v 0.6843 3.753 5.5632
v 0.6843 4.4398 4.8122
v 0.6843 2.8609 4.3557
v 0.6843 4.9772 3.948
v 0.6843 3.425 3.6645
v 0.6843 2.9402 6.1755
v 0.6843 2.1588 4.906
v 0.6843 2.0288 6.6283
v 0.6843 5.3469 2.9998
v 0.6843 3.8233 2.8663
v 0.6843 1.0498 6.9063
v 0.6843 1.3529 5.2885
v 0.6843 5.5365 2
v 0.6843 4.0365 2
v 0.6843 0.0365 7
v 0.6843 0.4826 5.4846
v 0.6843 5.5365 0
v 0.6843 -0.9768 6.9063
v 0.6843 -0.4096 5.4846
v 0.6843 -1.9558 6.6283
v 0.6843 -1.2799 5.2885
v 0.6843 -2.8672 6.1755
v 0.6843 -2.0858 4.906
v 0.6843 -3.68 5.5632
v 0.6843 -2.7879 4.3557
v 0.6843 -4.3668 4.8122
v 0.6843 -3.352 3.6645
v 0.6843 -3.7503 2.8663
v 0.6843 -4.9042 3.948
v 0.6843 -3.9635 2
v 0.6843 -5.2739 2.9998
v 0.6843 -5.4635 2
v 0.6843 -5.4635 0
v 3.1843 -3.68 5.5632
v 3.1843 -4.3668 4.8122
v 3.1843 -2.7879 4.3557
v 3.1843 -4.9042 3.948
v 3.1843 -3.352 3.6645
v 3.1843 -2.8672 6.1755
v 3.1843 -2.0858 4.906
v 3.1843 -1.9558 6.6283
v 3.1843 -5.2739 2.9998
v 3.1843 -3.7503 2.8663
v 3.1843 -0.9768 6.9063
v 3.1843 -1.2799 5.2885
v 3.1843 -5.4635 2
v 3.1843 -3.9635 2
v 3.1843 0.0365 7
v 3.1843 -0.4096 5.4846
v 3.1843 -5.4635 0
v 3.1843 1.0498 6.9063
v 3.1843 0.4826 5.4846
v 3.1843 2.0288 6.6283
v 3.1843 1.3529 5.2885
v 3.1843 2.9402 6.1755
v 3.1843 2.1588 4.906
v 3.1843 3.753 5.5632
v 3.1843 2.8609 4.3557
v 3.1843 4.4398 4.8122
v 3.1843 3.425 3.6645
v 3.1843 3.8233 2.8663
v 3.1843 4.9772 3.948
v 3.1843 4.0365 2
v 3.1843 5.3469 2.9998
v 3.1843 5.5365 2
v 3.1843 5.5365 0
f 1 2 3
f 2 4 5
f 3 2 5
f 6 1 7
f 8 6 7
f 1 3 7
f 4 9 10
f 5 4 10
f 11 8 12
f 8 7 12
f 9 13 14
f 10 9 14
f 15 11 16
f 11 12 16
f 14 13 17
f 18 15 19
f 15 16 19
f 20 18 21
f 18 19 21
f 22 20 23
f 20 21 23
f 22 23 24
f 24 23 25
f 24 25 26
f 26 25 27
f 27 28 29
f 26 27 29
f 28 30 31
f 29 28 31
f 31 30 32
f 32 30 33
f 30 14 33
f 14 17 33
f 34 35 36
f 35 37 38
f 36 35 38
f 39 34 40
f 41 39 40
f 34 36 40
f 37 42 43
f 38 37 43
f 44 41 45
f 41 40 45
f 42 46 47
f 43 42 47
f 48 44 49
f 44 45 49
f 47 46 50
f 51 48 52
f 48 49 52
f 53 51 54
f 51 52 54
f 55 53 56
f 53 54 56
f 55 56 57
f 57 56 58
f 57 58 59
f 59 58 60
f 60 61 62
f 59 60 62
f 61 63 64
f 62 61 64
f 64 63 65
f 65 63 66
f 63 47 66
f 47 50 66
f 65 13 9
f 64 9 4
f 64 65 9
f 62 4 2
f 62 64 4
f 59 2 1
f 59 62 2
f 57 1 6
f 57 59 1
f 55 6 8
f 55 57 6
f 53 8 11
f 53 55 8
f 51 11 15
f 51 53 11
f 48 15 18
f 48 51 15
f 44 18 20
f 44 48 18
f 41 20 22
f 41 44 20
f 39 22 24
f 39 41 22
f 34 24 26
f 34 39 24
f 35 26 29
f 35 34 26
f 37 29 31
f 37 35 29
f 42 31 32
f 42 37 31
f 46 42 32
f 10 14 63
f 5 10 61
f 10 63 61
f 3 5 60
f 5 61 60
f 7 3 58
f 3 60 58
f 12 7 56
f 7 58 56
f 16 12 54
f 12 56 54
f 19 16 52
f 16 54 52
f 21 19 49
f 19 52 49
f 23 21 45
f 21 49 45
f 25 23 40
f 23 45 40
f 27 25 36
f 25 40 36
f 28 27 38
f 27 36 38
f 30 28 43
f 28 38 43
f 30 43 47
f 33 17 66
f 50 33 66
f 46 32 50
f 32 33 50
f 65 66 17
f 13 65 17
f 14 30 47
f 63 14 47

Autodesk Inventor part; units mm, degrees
ref_plane "YZ Plane" through (0, 0, 0) normal (1, 0, 0) x (0, 1, 0)
ref_plane "XZ Plane" through (0, 0, 0) normal (0, 1, 0) x (-1, 0, 0)
ref_plane "XY Plane" through (0, 0, 0) normal (0, 0, 1) x (1, 0, 0)
sketch "Sketch1" plane through (0, 0, 0) normal (0, 0, 1) x (1, 0, 0)
  circle A0 centre (1.9343, 0.0365) radius 1.25 construction
  line L0 (0.6843, -5.4635) -> (3.1843, -5.4635)
  line L1 (3.1843, -5.4635) -> (3.1843, 5.5365)
  line L2 (3.1843, 5.5365) -> (0.6843, 5.5365)
  line L3 (0.6843, 5.5365) -> (0.6843, -5.4635)
  line L4 (0.6843, -5.4635) -> (3.1843, 5.5365) construction
  line L5 (3.1843, -5.4635) -> (0.6843, 5.5365) construction
  point P0 (0, 0)
  dimension "d0" = 11
  dimension "d1" = 2.5
extrude "Extrusion1" add sketch "Sketch1" along normal blind 2
sketch "Sketch2" plane through (3.1843, -5.4635, 0) normal (1, 0, 0) x (0, 0, -1)
  line L0 (-2, 0) -> (-2, 11) projected
  line L1 (-2, 0) -> (-2, 11)
  line L2 (-2, 5.5) -> (-7, 5.5)
  arc A0 (-2, 11) -> (-2, 0) centre (-1.475, 5.5) ccw
  line L3 (-2, 0) -> (-2, 1.5)
  line L4 (-2, 11) -> (-2, 9.5)
  line L5 (-7, 5.5) -> (-5.5, 5.5)
  arc A1 (-2, 9.5) -> (-2, 1.5) centre (-1.475, 5.5) ccw
  point P0 (0, 5.4635)
  dimension "d4" = 5
  dimension "d5" = 1.5
  dimension "d6" = 1.5
  dimension "d7" = 1.5
extrude "Extrusion2" add sketch "Sketch2" against normal up to surface (2.5 mm away) contours A0 L2 A1 L0 | A0 L0 A1 L2
equation "\"d6\" = d5"
equation "\"d7\" = d5"
properties part number "hook_loop"
